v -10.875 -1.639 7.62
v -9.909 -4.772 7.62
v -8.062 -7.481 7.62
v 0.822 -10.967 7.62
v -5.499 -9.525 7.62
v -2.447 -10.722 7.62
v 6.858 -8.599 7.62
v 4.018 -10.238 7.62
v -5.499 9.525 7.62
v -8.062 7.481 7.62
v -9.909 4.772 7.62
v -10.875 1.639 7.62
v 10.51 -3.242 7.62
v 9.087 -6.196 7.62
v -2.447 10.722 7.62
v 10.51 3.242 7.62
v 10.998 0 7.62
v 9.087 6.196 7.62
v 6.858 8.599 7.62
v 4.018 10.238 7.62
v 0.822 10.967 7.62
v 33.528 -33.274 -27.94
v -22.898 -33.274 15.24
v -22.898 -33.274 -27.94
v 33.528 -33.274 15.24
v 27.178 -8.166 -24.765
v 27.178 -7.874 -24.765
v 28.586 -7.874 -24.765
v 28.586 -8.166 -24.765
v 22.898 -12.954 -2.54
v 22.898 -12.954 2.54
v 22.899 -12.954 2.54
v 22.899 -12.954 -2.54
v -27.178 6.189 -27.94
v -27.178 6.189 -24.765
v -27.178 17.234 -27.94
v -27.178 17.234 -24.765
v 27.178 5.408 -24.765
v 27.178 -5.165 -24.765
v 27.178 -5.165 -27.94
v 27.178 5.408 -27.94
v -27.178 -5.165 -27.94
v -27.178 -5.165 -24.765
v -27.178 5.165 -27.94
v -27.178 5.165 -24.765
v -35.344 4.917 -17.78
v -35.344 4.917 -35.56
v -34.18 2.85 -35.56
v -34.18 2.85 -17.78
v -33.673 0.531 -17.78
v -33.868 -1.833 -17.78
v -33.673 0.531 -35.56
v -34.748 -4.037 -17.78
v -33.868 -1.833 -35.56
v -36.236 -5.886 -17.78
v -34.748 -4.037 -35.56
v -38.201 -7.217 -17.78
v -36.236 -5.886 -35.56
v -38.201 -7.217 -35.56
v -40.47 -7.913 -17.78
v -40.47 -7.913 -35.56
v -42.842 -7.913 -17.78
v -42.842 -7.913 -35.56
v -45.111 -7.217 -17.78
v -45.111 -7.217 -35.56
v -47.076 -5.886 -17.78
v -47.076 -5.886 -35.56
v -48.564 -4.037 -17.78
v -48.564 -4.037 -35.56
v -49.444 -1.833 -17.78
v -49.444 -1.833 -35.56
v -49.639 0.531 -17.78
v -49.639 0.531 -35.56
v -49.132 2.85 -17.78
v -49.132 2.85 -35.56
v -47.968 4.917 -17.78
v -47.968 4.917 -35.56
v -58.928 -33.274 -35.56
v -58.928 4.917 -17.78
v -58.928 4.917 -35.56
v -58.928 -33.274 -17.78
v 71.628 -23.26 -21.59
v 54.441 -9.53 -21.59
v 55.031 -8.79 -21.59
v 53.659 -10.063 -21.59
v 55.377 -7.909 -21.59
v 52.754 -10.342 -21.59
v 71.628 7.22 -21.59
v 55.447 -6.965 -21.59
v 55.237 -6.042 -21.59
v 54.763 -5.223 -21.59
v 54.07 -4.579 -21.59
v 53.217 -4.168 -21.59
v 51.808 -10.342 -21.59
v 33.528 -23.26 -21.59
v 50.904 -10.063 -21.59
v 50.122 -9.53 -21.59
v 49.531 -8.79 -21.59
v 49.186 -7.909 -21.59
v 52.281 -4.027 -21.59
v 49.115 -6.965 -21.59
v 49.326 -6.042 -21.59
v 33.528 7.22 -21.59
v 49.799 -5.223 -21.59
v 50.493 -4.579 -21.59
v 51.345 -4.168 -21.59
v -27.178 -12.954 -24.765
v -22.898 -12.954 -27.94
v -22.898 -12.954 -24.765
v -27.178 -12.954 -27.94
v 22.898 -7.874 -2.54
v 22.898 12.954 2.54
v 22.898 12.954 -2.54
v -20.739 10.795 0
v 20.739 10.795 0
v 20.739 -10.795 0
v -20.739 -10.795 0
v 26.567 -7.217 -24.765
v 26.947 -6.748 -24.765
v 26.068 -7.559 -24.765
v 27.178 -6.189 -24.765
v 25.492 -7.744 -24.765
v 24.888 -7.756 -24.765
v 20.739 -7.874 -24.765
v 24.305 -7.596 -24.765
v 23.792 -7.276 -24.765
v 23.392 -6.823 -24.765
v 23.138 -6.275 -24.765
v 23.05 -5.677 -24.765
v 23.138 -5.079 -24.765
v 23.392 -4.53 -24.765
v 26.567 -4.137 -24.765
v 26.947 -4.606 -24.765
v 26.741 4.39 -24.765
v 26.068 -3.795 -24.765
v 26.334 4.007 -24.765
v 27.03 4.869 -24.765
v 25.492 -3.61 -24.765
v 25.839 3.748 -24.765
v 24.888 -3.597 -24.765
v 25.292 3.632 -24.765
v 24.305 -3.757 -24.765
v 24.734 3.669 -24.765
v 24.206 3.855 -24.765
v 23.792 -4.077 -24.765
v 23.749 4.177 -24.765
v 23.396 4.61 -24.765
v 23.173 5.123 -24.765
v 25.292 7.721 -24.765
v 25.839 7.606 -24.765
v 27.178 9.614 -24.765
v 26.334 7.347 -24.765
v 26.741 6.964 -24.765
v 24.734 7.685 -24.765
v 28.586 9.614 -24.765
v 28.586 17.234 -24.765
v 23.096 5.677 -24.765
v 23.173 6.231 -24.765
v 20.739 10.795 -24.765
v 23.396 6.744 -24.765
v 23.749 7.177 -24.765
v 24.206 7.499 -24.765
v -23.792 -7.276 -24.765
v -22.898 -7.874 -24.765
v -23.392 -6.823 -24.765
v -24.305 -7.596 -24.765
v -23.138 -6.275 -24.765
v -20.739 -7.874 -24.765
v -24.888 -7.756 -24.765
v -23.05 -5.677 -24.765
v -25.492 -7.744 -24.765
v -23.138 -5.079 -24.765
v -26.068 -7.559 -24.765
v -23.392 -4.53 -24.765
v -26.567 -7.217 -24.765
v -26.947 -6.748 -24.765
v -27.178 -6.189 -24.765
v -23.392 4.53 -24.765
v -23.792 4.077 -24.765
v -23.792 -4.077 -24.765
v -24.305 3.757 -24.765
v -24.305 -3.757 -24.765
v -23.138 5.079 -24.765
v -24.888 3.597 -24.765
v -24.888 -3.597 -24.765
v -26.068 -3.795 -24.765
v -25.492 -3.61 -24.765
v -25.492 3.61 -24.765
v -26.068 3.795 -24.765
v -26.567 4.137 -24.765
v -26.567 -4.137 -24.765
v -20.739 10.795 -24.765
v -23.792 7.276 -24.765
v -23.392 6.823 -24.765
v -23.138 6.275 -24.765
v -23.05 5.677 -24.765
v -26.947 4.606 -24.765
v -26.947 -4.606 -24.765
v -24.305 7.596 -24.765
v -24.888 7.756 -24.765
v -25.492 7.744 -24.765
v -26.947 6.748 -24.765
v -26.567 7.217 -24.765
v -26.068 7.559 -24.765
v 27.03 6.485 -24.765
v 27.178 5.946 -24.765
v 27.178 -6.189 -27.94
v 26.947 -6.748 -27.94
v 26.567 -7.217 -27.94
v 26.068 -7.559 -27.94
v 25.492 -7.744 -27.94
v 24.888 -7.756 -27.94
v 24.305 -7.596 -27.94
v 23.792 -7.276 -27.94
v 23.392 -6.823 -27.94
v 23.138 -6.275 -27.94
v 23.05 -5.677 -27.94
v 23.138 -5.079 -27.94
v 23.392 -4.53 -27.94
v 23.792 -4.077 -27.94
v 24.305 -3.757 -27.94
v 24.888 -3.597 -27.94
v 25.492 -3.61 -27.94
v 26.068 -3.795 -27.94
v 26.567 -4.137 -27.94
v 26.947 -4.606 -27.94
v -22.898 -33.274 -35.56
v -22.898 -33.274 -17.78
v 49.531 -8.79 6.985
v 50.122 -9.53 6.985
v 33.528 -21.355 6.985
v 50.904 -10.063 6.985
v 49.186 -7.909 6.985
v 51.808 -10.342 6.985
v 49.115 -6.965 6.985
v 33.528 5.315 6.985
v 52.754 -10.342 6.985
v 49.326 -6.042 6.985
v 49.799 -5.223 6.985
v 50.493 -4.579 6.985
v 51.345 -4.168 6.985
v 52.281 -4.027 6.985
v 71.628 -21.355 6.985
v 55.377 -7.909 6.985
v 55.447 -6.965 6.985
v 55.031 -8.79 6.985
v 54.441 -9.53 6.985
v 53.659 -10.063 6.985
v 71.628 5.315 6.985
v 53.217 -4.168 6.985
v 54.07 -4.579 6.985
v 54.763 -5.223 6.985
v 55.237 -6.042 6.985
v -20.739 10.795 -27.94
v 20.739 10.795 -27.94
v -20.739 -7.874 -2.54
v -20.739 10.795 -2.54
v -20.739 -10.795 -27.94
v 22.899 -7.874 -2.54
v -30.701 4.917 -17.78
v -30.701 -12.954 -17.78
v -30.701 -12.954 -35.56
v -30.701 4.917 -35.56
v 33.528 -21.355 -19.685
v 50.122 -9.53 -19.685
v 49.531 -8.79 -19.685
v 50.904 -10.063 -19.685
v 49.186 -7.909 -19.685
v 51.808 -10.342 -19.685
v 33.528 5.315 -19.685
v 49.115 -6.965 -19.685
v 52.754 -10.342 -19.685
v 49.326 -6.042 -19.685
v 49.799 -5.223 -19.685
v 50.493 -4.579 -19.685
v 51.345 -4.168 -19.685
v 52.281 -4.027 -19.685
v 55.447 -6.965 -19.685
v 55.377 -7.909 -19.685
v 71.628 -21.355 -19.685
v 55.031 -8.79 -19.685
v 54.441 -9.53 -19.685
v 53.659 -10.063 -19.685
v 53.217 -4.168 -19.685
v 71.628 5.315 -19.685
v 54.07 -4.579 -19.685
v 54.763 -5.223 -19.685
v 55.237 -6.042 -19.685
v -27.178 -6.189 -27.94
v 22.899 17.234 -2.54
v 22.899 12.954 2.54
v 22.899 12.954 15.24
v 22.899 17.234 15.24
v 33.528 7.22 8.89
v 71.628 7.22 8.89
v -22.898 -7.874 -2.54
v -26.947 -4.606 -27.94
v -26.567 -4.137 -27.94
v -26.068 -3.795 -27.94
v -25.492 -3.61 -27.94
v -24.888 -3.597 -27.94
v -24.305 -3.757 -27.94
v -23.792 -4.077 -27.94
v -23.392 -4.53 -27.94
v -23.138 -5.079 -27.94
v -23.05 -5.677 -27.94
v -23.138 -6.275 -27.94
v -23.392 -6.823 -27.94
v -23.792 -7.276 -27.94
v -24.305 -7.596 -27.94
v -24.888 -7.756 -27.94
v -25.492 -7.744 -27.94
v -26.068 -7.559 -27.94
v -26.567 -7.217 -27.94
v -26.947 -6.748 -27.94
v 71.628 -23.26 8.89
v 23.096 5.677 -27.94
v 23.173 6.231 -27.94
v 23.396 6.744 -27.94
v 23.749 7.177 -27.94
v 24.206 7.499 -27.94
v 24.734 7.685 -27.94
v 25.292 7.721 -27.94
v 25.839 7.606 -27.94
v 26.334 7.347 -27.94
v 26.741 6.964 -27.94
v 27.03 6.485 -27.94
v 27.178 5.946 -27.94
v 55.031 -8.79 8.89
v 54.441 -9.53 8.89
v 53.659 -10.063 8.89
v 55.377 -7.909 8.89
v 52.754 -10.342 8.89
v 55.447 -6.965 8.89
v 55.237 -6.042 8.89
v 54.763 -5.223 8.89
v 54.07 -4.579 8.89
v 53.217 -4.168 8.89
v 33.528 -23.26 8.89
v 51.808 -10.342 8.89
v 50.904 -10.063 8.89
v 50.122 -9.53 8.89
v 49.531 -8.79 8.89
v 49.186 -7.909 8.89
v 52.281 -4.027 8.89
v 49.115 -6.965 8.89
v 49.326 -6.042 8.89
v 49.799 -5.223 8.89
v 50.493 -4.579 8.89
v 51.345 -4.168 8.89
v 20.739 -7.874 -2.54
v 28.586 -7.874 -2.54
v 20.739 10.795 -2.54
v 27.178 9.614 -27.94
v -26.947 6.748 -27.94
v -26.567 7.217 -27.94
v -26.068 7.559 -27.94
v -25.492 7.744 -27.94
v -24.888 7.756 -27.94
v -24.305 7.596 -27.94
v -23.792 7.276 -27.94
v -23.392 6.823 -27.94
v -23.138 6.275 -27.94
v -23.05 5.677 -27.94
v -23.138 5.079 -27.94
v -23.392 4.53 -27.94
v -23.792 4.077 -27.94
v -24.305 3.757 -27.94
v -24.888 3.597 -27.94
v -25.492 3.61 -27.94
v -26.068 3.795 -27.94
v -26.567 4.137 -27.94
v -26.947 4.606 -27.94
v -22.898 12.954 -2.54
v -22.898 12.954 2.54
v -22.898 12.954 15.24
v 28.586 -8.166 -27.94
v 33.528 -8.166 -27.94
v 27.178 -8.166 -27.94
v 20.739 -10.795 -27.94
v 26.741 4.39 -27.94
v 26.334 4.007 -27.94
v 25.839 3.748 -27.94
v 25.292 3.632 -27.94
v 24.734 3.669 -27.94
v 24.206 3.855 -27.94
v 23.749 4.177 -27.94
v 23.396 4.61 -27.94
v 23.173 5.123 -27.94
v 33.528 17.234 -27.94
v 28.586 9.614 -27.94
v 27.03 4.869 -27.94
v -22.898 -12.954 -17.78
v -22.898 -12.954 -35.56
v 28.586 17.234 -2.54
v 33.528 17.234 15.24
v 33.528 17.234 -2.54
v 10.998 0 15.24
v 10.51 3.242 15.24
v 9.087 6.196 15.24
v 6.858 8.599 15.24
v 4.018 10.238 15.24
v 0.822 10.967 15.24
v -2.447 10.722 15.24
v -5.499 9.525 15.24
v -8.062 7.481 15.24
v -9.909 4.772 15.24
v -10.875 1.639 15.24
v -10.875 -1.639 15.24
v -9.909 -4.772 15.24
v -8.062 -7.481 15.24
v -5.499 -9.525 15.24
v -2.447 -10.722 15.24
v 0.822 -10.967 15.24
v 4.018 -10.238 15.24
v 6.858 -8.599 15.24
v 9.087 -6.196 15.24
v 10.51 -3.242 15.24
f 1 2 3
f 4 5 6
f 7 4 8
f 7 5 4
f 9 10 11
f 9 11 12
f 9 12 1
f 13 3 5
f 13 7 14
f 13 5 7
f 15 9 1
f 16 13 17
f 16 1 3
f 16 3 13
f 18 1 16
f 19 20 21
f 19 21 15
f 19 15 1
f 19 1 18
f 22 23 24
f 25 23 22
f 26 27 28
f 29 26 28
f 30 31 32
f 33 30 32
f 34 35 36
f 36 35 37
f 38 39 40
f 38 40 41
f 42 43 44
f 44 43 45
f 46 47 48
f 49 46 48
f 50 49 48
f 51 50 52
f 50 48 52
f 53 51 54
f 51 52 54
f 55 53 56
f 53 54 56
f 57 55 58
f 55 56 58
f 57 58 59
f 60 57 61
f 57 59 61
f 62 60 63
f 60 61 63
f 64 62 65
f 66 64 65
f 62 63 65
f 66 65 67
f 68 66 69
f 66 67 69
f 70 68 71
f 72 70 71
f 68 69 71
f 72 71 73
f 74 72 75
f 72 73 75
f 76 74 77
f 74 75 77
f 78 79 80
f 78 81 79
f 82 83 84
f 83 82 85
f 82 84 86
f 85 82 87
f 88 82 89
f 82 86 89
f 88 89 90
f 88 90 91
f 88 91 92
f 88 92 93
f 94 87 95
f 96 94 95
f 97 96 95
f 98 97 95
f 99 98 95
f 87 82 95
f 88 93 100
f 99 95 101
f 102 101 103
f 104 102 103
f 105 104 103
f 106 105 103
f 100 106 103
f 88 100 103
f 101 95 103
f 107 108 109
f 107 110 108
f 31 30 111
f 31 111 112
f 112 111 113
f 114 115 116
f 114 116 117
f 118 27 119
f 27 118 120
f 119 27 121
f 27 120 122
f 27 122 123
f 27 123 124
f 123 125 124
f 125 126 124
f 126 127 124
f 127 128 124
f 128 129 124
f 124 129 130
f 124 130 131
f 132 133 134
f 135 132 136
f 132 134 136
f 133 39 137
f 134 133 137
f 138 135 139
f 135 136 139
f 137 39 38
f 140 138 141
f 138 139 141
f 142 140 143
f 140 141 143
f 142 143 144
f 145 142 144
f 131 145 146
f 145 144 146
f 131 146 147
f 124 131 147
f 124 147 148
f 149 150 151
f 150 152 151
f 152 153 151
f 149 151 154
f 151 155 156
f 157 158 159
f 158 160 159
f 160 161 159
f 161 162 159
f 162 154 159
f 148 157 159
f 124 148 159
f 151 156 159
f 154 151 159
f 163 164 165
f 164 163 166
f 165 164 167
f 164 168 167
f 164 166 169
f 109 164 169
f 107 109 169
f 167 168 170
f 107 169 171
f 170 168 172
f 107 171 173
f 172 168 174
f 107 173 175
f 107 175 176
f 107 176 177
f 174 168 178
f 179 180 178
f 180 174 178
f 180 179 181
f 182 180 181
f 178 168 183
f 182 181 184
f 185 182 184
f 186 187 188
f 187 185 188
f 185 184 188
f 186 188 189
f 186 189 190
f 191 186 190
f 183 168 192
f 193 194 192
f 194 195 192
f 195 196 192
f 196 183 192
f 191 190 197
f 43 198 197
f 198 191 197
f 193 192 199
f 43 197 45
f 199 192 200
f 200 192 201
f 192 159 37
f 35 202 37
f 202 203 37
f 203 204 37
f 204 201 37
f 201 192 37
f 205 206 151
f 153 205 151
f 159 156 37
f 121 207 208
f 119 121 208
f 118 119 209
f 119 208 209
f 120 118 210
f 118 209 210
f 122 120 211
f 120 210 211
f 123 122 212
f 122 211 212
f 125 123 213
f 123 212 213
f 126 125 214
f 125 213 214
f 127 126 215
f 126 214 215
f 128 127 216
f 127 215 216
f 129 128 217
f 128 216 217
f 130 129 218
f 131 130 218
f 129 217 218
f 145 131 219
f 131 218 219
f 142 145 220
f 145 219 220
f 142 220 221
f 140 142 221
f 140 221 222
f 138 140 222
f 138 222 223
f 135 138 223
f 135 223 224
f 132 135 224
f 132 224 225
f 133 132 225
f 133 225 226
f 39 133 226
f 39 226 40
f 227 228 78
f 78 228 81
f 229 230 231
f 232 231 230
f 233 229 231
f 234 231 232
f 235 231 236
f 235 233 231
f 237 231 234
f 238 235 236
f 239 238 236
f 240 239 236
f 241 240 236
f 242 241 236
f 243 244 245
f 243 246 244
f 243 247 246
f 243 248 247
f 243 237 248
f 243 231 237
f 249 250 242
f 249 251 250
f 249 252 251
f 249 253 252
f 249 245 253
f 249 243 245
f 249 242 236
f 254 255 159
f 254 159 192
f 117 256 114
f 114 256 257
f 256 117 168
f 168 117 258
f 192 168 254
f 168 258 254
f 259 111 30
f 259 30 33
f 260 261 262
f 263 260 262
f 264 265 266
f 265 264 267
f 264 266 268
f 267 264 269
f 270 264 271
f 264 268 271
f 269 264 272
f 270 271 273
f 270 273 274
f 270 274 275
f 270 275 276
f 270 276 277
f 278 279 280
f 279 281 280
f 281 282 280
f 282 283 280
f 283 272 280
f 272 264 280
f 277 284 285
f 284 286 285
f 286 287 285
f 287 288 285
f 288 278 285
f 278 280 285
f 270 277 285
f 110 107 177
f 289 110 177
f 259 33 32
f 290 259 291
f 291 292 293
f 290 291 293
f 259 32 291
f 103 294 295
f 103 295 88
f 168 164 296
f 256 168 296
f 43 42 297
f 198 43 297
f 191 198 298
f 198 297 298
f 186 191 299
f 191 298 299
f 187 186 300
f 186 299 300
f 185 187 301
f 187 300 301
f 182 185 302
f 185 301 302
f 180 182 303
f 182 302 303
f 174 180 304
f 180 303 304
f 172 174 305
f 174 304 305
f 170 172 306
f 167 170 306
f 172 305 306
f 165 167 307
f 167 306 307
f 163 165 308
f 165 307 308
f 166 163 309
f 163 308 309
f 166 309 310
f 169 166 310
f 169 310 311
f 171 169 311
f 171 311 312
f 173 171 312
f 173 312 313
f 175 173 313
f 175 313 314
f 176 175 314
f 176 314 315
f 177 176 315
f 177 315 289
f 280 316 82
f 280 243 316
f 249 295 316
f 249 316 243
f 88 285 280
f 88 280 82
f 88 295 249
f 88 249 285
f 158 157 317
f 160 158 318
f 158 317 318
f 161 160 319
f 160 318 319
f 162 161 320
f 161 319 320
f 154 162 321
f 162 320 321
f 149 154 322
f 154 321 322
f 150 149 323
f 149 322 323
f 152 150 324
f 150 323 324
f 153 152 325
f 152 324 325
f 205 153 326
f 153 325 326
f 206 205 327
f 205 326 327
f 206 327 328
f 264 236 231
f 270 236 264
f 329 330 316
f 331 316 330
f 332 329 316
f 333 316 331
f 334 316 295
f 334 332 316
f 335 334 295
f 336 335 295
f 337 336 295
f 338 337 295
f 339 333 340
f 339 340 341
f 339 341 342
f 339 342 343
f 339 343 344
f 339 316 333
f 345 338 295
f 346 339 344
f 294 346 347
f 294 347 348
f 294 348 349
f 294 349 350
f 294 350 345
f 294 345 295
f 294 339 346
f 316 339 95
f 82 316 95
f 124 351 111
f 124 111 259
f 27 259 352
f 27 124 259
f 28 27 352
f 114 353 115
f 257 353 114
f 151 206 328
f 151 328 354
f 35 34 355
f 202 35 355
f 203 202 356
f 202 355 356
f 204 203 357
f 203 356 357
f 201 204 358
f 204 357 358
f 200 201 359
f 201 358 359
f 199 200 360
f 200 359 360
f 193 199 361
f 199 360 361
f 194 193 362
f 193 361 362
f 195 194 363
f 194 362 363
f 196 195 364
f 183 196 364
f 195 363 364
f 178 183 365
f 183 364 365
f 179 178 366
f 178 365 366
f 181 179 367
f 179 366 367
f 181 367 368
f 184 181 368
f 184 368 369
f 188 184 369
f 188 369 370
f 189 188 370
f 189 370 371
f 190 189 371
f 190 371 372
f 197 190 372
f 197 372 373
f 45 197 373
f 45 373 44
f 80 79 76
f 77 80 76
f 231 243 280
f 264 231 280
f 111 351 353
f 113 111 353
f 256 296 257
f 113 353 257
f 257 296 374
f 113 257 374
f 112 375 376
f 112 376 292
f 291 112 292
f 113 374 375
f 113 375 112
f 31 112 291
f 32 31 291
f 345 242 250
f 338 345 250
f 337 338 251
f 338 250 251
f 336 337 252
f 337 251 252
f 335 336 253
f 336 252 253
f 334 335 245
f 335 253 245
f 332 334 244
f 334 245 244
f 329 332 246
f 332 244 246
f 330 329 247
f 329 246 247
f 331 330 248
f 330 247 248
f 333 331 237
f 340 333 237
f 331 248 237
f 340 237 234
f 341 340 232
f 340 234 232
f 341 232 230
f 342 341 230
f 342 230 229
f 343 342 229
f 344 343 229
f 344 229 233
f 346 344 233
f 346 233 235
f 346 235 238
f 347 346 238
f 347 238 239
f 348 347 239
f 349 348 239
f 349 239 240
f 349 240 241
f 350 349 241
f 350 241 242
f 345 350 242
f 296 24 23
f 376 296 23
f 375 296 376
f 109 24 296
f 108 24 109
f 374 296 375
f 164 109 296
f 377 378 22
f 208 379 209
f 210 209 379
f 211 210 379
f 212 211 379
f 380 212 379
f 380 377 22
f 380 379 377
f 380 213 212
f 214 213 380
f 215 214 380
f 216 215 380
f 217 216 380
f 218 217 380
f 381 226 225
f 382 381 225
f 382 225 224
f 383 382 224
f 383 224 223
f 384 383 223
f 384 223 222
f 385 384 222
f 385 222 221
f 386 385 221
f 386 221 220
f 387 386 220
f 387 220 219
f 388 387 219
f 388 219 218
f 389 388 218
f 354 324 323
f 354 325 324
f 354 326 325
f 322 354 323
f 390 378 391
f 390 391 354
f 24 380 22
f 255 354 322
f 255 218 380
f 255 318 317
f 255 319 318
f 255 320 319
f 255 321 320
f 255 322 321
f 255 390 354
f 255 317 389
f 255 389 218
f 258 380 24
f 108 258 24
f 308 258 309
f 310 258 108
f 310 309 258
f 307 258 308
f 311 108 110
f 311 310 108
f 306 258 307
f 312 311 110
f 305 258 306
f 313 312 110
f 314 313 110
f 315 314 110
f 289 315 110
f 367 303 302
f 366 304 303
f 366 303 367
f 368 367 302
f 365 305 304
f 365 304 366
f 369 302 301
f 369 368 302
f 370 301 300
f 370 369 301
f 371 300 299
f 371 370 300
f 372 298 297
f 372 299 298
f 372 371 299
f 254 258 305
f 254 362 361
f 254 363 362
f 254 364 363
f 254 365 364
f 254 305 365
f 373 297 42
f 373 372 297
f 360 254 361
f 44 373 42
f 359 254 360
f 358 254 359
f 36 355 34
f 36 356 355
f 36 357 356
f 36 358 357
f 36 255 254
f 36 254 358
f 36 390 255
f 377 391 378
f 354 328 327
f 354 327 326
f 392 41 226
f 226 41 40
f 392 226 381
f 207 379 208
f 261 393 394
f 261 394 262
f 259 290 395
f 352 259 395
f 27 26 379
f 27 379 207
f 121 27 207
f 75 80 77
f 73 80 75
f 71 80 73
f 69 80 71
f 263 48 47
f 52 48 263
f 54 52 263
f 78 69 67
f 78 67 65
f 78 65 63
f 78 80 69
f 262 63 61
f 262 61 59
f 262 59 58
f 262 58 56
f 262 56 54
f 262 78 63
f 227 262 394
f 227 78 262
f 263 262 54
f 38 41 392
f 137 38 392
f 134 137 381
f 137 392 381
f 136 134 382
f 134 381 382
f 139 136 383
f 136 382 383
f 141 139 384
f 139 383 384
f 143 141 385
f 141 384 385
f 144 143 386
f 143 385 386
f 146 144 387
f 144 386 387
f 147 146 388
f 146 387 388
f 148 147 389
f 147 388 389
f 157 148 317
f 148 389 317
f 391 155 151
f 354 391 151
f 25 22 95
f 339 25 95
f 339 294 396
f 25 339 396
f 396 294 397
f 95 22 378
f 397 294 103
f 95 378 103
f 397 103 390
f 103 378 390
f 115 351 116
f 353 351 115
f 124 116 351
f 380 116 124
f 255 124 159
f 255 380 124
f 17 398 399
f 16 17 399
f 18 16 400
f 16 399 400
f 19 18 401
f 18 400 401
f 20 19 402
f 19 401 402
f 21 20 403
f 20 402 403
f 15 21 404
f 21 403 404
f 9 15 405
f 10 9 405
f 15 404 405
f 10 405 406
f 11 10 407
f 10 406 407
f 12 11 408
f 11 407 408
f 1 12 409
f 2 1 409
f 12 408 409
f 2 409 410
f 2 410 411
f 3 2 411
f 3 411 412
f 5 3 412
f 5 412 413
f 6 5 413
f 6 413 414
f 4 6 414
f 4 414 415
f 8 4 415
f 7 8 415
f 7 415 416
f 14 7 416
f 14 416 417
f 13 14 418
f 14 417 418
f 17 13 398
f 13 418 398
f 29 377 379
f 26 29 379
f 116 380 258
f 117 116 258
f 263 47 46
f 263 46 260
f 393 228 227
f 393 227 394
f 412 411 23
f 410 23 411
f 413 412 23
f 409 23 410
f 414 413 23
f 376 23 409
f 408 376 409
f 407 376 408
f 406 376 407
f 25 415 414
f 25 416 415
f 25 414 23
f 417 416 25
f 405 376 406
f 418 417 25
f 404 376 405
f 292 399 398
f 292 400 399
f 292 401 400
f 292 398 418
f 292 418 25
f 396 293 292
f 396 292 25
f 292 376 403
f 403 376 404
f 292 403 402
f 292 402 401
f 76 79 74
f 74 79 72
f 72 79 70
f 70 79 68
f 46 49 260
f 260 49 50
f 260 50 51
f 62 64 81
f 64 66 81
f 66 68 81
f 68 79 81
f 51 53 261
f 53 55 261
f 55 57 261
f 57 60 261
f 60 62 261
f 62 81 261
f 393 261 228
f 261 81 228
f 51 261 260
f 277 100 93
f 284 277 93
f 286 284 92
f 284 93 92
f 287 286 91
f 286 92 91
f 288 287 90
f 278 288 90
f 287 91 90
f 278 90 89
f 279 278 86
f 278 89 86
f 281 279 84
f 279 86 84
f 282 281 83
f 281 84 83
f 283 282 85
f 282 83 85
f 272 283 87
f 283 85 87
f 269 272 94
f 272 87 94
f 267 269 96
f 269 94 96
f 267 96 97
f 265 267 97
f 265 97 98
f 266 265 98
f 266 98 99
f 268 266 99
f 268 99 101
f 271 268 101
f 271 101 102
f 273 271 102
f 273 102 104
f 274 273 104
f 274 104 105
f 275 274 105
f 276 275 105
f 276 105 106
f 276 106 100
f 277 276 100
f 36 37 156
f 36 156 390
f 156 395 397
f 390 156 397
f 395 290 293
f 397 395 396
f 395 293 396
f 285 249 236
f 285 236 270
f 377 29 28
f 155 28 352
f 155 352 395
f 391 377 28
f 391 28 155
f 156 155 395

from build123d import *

# Parameters (mm, degrees)
SKETCH1_W                = 54.356
SKETCH1_H                = 34.4678
SKETCH1_W_2              = 40.2082
SKETCH1_H_2              = 20.32
BOSS_EXTRUDE1_DEPTH      = 27.94
SKETCH2_W                = 54.356
SKETCH2_H                = 34.4678
SKETCH2_W_2              = 45.7962
SKETCH2_H_2              = 25.908
CUT_EXTRUDE1_DEPTH       = 24.765
SKETCH3_R                = 2.04968225
SKETCH3_R_2              = 2.0955
CUT_EXTRUDE2_DEPTH       = 43.618007851
SKETCH4_W                = 19.05
SKETCH4_H                = 9.525
CUT_EXTRUDE3_DEPTH       = 12.7
SKETCH5_W                = 45.7962
SKETCH5_H                = 25.908
BOSS_EXTRUDE2_DEPTH      = 2.54
SKETCH6_W                = 25.4
SKETCH6_H                = 4.2799
BOSS_EXTRUDE3_DEPTH      = 27.305
SKETCH7_W                = 25.4
SKETCH7_H                = 6.35
BOSS_EXTRUDE4_DEPTH      = 19.05
SKETCH10_W               = 3.175
SKETCH10_H               = 19.05
BOSS_EXTRUDE5_DEPTH      = 19.05
CHAMFER1_SIZE            = 19.05
SKETCH12_W               = 7.62
SKETCH12_H               = 31.75
BOSS_EXTRUDE6_DEPTH      = 3.175
SKETCH13_W               = 41.4782
SKETCH13_H               = 21.59
CUT_EXTRUDE7_DEPTH       = 27.94
SKETCH14_W               = 22.225
SKETCH14_H               = 20.828
SKETCH14_W_2             = 49.53
SKETCH14_H_2             = 7.4549
CUT_EXTRUDE8_DEPTH       = 61.866925258
SKETCH15_W               = 3.175
SKETCH15_H               = 4.2799
CUT_EXTRUDE9_DEPTH       = 64.49980823
SKETCH16_W               = 45.796723327
SKETCH16_H               = 30.48
BOSS_EXTRUDE7_DEPTH      = 20.32
BOSS_EXTRUDE8_DEPTH      = 7.62
BOSS_EXTRUDE8_DEPTH_BACK = 10.16
SKETCH17_W               = 36.0299
SKETCH17_H               = 20.32
SKETCH18_W               = 28.227007584
SKETCH18_H               = 17.78
BOSS_EXTRUDE9_DEPTH      = 17.871186
SKETCH19_R               = 8.001
CUT_EXTRUDE10_DEPTH      = 17.78
SKETCH20_W               = 19.05
SKETCH20_H               = 21.1201
CUT_EXTRUDE11_DEPTH      = 70.85190382
SKETCH21_W               = 45.796723327
SKETCH21_H               = 46.228
BOSS_EXTRUDE10_DEPTH     = 12.7
SKETCH23_R               = 10.9982
CUT_EXTRUDE12_DEPTH      = 7.62
SKETCH25_W               = 6.35
SKETCH25_H               = 7.62
SKETCH25_W_2             = 10.629376673
SKETCH25_H_2             = 25.1079
BOSS_EXTRUDE12_DEPTH     = 3.175
SKETCH26_W               = 10.629376673
SKETCH26_H               = 50.5079
BOSS_EXTRUDE14_DEPTH     = 17.78
BOSS_EXTRUDE15_START     = -3.175
SKETCH27_W               = 4.942428742
SKETCH27_H               = 50.5079
BOSS_EXTRUDE15_DEPTH     = 25.4
SKETCH28_W               = 7.846471258
SKETCH28_H               = 22.225
BOSS_EXTRUDE16_DEPTH     = 25.4
SKETCH29_W               = 30.48
SKETCH29_H               = 30.48
BOSS_EXTRUDE17_DEPTH     = 38.1
SKETCH30_W               = 26.67
SKETCH30_H               = 26.67
CUT_EXTRUDE13_DEPTH      = 38.1
SKETCH31_R               = 3.175
CUT_EXTRUDE14_DEPTH      = 88.144583079


with BuildPart() as part:
    # Sketch1 → Boss-Extrude1 (new body)
    with BuildSketch(Plane.XY):
        Rectangle(SKETCH1_W, SKETCH1_H)
        Rectangle(SKETCH1_W_2, SKETCH1_H_2, mode=Mode.SUBTRACT)
    extrude(amount=-BOSS_EXTRUDE1_DEPTH)

    # Sketch2 → Cut-Extrude1 (cut)
    with BuildSketch(Plane.XY):
        Rectangle(SKETCH2_W, SKETCH2_H)
        Rectangle(SKETCH2_W_2, SKETCH2_H_2, mode=Mode.SUBTRACT)
    extrude(amount=-CUT_EXTRUDE1_DEPTH, mode=Mode.SUBTRACT)

    # Sketch3 → Cut-Extrude2 (cut, through all)
    with BuildSketch(Plane(origin=(0, 0, -27.94), x_dir=(-1, 0, 0), z_dir=(0, 0, -1))):
        with Locations((-25.146, 5.6769)):
            Circle(SKETCH3_R)
        with Locations((-25.146, -5.6769)):
            Circle(SKETCH3_R_2)
        with Locations((25.146, -5.6769)):
            Circle(SKETCH3_R_2)
        with Locations((25.146, 5.6769)):
            Circle(SKETCH3_R_2)
    extrude(amount=-CUT_EXTRUDE2_DEPTH, mode=Mode.SUBTRACT)

    # Sketch4 → Cut-Extrude3 (cut)
    with BuildSketch(Plane(origin=(22.8981, 0, 0), x_dir=(0, 0, -1), z_dir=(1, 0, 0))):
        with Locations((12.065, 0)):
            Rectangle(SKETCH4_W, SKETCH4_H)
    extrude(amount=-CUT_EXTRUDE3_DEPTH, mode=Mode.SUBTRACT)

    # Sketch5 → Boss-Extrude2 (add)
    with BuildSketch(Plane.XY):
        Rectangle(SKETCH5_W, SKETCH5_H)
    extrude(amount=BOSS_EXTRUDE2_DEPTH)

    # Sketch6 → Boss-Extrude3 (add)
    with BuildSketch(Plane.XY.offset(2.54)):
        with Locations((0, -15.09395)):
            Rectangle(SKETCH6_W, SKETCH6_H)
    extrude(amount=-BOSS_EXTRUDE3_DEPTH)

    # Sketch7 → Boss-Extrude4 (add)
    with BuildSketch(Plane.XY.offset(2.54)):
        with Locations((0, -14.0589)):
            Rectangle(SKETCH7_W, SKETCH7_H)
    extrude(amount=BOSS_EXTRUDE4_DEPTH)

    # Sketch10 → Boss-Extrude5 (add)
    with BuildSketch(Plane(origin=(0, -10.8839, 0), x_dir=(1, 0, 0), z_dir=(0, 1, 0))):
        with Locations((11.1125, -12.065)):
            Rectangle(SKETCH10_W, SKETCH10_H)
        with Locations((-11.1125, -12.065)):
            Rectangle(SKETCH10_W, SKETCH10_H)
    extrude(amount=BOSS_EXTRUDE5_DEPTH)

    # Chamfer1
    chamfer1_edges = [part.edges().sort_by_distance(p)[0] for p in [
        (-11.1125, 8.1661, 21.59),
        (11.1125, 8.1661, 21.59),
    ]]
    chamfer(chamfer1_edges, length=CHAMFER1_SIZE - 0.0001)  # a hair under: the kernel refuses the full size

    # Sketch12 → Boss-Extrude6 (add)
    with BuildSketch(Plane.XZ.offset(17.2339)):
        with Locations((0, -12.065)):
            Rectangle(SKETCH12_W, SKETCH12_H)
    extrude(amount=BOSS_EXTRUDE6_DEPTH)

    # Sketch13 → Cut-Extrude7 (cut)
    with BuildSketch(Plane(origin=(0, 0, -27.94), x_dir=(-1, 0, 0), z_dir=(0, 0, -1))):
        Rectangle(SKETCH13_W, SKETCH13_H)
    extrude(amount=-CUT_EXTRUDE7_DEPTH, mode=Mode.SUBTRACT)

    # Sketch14 → Cut-Extrude8 (cut, through all)
    with BuildSketch(Plane.ZY.offset(22.8981)):
        with Locations((-13.6525, 2.54)):
            Rectangle(SKETCH14_W, SKETCH14_H)
        with Locations((-3.175, -16.68145)):
            Rectangle(SKETCH14_W_2, SKETCH14_H_2)
    extrude(amount=-CUT_EXTRUDE8_DEPTH, mode=Mode.SUBTRACT)

    # Sketch15 → Cut-Extrude9 (cut, through all)
    with BuildSketch(Plane.ZY.offset(27.178)):
        with Locations((-26.3525, -15.09395)):
            Rectangle(SKETCH15_W, SKETCH15_H)
    extrude(amount=-CUT_EXTRUDE9_DEPTH, mode=Mode.SUBTRACT)

    # Sketch16 → Boss-Extrude7 (add)
    with BuildSketch(Plane.XZ.offset(12.954)):
        with Locations((0.000261663, -12.7)):
            Rectangle(SKETCH16_W, SKETCH16_H)
    extrude(amount=BOSS_EXTRUDE7_DEPTH)

    # Sketch20 → Cut-Extrude11 (cut, through all)
    with BuildSketch(Plane.ZY.offset(22.8981)):
        with Locations((12.065, -2.39395)):
            Rectangle(SKETCH20_W, SKETCH20_H)
    extrude(amount=-CUT_EXTRUDE11_DEPTH, mode=Mode.SUBTRACT)

    # Sketch21 → Boss-Extrude10 (add)
    with BuildSketch(Plane.XY.offset(2.54)):
        with Locations((0.000261663, -10.16)):
            Rectangle(SKETCH21_W, SKETCH21_H)
    extrude(amount=BOSS_EXTRUDE10_DEPTH)

    # Sketch23 → Cut-Extrude12 (cut)
    with BuildSketch(Plane.XY.offset(15.24)):
        with Locations((0.000261663, 0)):
            Circle(SKETCH23_R)
    extrude(amount=-CUT_EXTRUDE12_DEPTH, mode=Mode.SUBTRACT)

    # Sketch25 → Boss-Extrude12 (add)
    with BuildSketch(Plane(origin=(0, 0, -27.94), x_dir=(-1, 0, 0), z_dir=(0, 0, -1))):
        with Locations((-30.353, 13.4239)):
            Rectangle(SKETCH25_W, SKETCH25_H)
        with Locations((-28.213311664, -20.72005)):
            Rectangle(SKETCH25_W_2, SKETCH25_H_2)
    extrude(amount=-BOSS_EXTRUDE12_DEPTH)

    # Sketch26 → Boss-Extrude14 (add)
    with BuildSketch(Plane.XY.offset(15.24)):
        with Locations((28.213311664, -8.02005)):
            Rectangle(SKETCH26_W, SKETCH26_H)
    extrude(amount=-BOSS_EXTRUDE14_DEPTH)

    # Sketch27 → Boss-Extrude15 (add)
    with BuildSketch(Plane.XY.offset(-24.765).offset(BOSS_EXTRUDE15_START)):
        with Locations((31.056785629, -8.02005)):
            Rectangle(SKETCH27_W, SKETCH27_H)
    extrude(amount=BOSS_EXTRUDE15_DEPTH)

    # Sketch28 → Boss-Extrude16 (add)
    with BuildSketch(Plane(origin=(0, -7.874, 0), x_dir=(1, 0, 0), z_dir=(0, 1, 0))):
        with Locations((24.662335629, 13.6525)):
            Rectangle(SKETCH28_W, SKETCH28_H)
    extrude(amount=-BOSS_EXTRUDE16_DEPTH)

    # Sketch29 → Boss-Extrude17 (add)
    with BuildSketch(Plane(origin=(33.528, 0, 0), x_dir=(0, 0, -1), z_dir=(1, 0, 0))):
        with Locations((6.35, -8.02005)):
            Rectangle(SKETCH29_W, SKETCH29_H)
    extrude(amount=BOSS_EXTRUDE17_DEPTH)

    # Sketch30 → Cut-Extrude13 (cut)
    with BuildSketch(Plane(origin=(71.628, 0, 0), x_dir=(0, 0, -1), z_dir=(1, 0, 0))):
        with Locations((6.35, -8.02005)):
            Rectangle(SKETCH30_W, SKETCH30_H)
    extrude(amount=-CUT_EXTRUDE13_DEPTH, mode=Mode.SUBTRACT)

    # Sketch31 → Cut-Extrude14 (cut, through all)
    with BuildSketch(Plane(origin=(0, 0, -21.59), x_dir=(-1, 0, 0), z_dir=(0, 0, -1))):
        with Locations(Location((-52.281109358, -7.202098737, 0), (0, 0, 90))):
            Circle(SKETCH31_R)
    extrude(amount=-CUT_EXTRUDE14_DEPTH, mode=Mode.SUBTRACT)


with BuildPart() as body_2:
    # Sketch17 → Boss-Extrude8 (new, two sides: drawn at the far end of the back side and taken through both)
    with BuildSketch(Plane(origin=(0, 0, -27.94), x_dir=(-1, 0, 0), z_dir=(0, 0, -1)).offset(-BOSS_EXTRUDE8_DEPTH_BACK)):
        with Locations((40.91305, -23.114)):
            Rectangle(SKETCH17_W, SKETCH17_H)
    extrude(amount=BOSS_EXTRUDE8_DEPTH + BOSS_EXTRUDE8_DEPTH_BACK)

    # Sketch18 → Boss-Extrude9 (add)
    with BuildSketch(Plane(origin=(0, -12.954, 0), x_dir=(1, 0, 0), z_dir=(0, 1, 0))):
        with Locations((-44.814496208, 26.67)):
            Rectangle(SKETCH18_W, SKETCH18_H)
    extrude(amount=BOSS_EXTRUDE9_DEPTH)

    # Sketch19 → Cut-Extrude10 (cut)
    with BuildSketch(Plane(origin=(0, 0, -35.56), x_dir=(-1, 0, 0), z_dir=(0, 0, -1))):
        with Locations((41.656, 0)):
            Circle(SKETCH19_R)
    extrude(amount=-CUT_EXTRUDE10_DEPTH, mode=Mode.SUBTRACT)


solid = Compound([part.part, body_2.part])
